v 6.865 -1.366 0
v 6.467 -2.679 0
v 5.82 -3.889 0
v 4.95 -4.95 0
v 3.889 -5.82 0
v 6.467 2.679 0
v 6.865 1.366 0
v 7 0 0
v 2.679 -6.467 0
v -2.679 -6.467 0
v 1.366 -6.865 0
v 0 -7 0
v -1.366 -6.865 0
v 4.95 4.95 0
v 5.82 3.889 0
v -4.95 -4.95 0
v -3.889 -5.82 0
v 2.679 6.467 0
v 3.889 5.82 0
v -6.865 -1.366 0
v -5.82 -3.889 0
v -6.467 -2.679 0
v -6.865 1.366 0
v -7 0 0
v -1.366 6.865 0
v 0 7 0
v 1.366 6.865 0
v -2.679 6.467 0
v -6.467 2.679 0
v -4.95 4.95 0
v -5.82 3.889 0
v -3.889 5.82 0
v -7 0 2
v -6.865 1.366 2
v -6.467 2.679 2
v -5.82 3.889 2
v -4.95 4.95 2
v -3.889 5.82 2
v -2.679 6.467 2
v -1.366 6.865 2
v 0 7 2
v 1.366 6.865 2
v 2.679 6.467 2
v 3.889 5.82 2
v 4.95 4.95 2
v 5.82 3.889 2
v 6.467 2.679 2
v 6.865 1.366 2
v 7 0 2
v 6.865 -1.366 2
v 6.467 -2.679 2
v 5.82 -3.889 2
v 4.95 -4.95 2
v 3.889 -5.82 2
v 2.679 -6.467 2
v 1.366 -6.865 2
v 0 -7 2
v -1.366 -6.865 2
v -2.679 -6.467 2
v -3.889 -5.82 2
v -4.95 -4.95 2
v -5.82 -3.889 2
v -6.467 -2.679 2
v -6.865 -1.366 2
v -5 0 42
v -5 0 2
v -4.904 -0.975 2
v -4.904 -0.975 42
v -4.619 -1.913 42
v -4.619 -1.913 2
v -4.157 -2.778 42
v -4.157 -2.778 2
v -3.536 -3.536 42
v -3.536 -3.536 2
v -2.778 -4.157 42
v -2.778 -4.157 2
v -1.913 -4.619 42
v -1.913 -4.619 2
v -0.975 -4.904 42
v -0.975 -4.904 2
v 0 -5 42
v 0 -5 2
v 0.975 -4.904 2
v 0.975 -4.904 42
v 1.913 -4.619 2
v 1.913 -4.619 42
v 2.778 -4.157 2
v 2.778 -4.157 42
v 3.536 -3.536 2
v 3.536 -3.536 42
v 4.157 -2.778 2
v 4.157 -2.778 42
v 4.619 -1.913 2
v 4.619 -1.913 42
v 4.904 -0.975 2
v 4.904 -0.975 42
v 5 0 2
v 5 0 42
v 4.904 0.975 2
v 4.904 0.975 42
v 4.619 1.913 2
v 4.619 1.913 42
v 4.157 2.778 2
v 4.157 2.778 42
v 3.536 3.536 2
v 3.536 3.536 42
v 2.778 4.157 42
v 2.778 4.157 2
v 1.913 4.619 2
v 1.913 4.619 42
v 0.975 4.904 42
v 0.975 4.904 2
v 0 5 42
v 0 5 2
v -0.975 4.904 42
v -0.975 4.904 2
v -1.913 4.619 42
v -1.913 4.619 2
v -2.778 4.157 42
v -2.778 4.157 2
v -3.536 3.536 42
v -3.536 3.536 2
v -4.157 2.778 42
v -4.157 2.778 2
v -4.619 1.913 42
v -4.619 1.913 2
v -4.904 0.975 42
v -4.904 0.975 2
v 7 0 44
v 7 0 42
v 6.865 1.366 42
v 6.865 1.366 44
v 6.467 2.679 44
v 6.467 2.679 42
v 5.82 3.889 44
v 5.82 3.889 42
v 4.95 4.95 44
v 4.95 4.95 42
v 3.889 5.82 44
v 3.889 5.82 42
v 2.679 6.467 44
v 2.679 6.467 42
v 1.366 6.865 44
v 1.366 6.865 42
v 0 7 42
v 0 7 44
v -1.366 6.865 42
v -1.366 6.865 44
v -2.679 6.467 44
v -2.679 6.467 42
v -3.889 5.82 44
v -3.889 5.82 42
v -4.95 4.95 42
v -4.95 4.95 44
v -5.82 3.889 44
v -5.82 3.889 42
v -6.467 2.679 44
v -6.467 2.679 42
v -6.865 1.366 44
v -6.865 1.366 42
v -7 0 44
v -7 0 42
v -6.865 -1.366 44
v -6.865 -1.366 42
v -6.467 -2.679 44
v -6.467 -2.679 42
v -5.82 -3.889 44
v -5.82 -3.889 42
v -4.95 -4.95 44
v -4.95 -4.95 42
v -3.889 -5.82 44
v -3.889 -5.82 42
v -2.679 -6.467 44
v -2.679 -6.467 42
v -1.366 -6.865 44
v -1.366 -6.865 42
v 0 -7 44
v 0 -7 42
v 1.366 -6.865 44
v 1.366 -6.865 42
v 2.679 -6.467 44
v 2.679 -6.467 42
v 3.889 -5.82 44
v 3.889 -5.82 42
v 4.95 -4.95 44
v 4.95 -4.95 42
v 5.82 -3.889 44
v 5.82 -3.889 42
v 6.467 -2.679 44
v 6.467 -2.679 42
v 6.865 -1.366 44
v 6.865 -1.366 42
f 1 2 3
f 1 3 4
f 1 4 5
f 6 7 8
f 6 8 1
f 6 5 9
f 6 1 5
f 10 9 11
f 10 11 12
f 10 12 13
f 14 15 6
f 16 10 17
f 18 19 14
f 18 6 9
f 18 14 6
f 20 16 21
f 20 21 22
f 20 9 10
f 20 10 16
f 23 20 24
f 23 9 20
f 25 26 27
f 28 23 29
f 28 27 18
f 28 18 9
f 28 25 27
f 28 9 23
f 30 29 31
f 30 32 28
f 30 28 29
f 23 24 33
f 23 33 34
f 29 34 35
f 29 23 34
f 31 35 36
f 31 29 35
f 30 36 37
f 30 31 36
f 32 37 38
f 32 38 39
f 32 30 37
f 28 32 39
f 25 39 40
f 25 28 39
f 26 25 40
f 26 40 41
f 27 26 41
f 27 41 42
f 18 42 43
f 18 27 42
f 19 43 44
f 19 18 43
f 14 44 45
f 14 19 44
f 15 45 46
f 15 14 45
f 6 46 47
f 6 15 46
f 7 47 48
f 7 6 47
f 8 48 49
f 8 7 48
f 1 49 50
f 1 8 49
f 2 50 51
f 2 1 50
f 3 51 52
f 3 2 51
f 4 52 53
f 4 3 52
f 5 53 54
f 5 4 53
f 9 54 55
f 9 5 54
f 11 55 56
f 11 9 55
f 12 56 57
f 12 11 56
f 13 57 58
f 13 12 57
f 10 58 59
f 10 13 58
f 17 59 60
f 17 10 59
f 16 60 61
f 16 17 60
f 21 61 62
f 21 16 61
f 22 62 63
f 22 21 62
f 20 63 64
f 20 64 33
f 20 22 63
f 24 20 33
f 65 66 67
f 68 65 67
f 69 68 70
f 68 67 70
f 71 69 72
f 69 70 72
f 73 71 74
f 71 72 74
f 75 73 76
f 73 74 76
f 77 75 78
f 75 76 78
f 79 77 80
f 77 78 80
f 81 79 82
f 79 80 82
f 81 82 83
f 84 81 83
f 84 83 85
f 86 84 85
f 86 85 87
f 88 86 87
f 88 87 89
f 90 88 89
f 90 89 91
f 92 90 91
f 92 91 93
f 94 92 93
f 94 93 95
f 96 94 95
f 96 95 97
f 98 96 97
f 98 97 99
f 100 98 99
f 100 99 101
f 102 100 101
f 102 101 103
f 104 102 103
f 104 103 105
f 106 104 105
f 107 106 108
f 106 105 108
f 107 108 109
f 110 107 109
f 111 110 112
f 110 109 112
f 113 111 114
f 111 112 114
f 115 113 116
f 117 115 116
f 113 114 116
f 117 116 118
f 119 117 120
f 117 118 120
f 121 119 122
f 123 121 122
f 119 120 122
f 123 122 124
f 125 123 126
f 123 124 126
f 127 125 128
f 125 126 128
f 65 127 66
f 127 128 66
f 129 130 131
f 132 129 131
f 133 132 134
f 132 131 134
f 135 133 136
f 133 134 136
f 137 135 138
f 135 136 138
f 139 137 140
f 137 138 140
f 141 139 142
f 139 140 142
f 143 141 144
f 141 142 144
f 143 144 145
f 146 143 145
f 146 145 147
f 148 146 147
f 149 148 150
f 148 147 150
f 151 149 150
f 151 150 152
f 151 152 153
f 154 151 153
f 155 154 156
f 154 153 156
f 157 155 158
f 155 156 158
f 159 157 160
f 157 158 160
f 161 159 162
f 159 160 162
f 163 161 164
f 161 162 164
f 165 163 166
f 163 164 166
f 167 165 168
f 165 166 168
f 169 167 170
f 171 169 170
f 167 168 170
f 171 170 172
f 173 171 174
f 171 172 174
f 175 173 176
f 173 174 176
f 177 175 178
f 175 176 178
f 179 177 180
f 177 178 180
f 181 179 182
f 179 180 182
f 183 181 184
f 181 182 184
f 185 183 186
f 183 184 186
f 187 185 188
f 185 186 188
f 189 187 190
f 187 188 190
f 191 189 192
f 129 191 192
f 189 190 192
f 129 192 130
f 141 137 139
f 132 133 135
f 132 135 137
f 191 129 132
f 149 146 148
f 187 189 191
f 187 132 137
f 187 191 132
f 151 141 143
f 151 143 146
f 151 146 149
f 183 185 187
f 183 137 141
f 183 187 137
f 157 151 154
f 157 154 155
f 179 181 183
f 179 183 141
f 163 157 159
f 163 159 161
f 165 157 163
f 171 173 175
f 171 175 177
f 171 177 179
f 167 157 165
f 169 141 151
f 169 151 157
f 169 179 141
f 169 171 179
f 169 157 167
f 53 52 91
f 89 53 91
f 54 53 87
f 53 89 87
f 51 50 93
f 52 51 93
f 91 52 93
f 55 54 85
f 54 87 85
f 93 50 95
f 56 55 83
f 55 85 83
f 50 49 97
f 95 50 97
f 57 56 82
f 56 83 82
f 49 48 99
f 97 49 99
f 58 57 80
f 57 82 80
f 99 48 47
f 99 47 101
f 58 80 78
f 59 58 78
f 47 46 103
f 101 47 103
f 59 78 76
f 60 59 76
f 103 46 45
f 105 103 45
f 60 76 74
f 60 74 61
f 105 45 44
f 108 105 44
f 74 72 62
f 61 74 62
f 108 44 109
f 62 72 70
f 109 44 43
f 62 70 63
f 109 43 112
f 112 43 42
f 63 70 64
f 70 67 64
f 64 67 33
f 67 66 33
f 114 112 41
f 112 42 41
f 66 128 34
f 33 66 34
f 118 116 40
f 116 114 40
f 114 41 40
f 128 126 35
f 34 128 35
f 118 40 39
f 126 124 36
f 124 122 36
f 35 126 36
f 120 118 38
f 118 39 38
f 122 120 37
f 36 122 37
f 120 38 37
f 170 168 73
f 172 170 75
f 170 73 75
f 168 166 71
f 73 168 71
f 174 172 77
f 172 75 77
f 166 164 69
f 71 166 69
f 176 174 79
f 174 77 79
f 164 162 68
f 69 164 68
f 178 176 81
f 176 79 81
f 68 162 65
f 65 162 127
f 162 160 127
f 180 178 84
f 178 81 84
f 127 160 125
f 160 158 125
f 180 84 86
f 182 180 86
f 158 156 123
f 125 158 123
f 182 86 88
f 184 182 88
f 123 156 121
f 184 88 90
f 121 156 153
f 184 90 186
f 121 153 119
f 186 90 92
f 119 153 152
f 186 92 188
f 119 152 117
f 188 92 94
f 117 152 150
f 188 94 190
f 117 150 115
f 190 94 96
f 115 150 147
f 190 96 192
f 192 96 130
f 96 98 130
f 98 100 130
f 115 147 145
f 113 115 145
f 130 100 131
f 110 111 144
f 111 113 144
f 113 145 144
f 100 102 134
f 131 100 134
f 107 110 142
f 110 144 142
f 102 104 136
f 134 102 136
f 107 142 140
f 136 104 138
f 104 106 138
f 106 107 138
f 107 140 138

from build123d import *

# Parameters (mm, degrees)
SKETCH_1_R        = 5
EXTRUDE_1_DEPTH   = 42
SKETCH_3_R        = 7
SKETCH_3_R_2      = 5
EXTRUDE_2_DEPTH   = 2
SKETCH_4_R        = 7
SKETCH_4_R_2      = 5
EXTRUDE_4_DEPTH   = 2
SKETCH_5_R        = 5
EXTRUDE_2_2_DEPTH = 2


with BuildPart() as part:
    # 草图1 → 凸台-拉伸1 (new body)
    with BuildSketch(Plane.XY):
        with Locations(Location((0, 0, 0), (0, 0, 180))):
            Circle(SKETCH_1_R)
    extrude(amount=EXTRUDE_1_DEPTH)

    # 草图3 → Extrude 2 (add)
    with BuildSketch(Plane(origin=(0, 0, 0), x_dir=(-1, 0, 0), z_dir=(0, 0, -1))):
        Circle(SKETCH_3_R)
        Circle(SKETCH_3_R_2, mode=Mode.SUBTRACT)
    extrude(amount=-EXTRUDE_2_DEPTH)



with BuildPart() as body_2:
    # 草图4 → 拉伸-薄壁4 (new body)
    with BuildSketch(Plane.XY.offset(42)):
        Circle(SKETCH_4_R)
        Circle(SKETCH_4_R_2, mode=Mode.SUBTRACT)
    extrude(amount=EXTRUDE_4_DEPTH)


with BuildPart() as part_1:
    add(part.part)

    add(body_2.part)  # Extrude 2 2 merges body 2
    # 草图5 → Extrude 2 2 (add)
    with BuildSketch(Plane.XY.offset(42)):
        with Locations(Location((0, 0, 0), (0, 0, 180))):
            Circle(SKETCH_5_R)
    extrude(amount=EXTRUDE_2_2_DEPTH)


solid = part_1.part
